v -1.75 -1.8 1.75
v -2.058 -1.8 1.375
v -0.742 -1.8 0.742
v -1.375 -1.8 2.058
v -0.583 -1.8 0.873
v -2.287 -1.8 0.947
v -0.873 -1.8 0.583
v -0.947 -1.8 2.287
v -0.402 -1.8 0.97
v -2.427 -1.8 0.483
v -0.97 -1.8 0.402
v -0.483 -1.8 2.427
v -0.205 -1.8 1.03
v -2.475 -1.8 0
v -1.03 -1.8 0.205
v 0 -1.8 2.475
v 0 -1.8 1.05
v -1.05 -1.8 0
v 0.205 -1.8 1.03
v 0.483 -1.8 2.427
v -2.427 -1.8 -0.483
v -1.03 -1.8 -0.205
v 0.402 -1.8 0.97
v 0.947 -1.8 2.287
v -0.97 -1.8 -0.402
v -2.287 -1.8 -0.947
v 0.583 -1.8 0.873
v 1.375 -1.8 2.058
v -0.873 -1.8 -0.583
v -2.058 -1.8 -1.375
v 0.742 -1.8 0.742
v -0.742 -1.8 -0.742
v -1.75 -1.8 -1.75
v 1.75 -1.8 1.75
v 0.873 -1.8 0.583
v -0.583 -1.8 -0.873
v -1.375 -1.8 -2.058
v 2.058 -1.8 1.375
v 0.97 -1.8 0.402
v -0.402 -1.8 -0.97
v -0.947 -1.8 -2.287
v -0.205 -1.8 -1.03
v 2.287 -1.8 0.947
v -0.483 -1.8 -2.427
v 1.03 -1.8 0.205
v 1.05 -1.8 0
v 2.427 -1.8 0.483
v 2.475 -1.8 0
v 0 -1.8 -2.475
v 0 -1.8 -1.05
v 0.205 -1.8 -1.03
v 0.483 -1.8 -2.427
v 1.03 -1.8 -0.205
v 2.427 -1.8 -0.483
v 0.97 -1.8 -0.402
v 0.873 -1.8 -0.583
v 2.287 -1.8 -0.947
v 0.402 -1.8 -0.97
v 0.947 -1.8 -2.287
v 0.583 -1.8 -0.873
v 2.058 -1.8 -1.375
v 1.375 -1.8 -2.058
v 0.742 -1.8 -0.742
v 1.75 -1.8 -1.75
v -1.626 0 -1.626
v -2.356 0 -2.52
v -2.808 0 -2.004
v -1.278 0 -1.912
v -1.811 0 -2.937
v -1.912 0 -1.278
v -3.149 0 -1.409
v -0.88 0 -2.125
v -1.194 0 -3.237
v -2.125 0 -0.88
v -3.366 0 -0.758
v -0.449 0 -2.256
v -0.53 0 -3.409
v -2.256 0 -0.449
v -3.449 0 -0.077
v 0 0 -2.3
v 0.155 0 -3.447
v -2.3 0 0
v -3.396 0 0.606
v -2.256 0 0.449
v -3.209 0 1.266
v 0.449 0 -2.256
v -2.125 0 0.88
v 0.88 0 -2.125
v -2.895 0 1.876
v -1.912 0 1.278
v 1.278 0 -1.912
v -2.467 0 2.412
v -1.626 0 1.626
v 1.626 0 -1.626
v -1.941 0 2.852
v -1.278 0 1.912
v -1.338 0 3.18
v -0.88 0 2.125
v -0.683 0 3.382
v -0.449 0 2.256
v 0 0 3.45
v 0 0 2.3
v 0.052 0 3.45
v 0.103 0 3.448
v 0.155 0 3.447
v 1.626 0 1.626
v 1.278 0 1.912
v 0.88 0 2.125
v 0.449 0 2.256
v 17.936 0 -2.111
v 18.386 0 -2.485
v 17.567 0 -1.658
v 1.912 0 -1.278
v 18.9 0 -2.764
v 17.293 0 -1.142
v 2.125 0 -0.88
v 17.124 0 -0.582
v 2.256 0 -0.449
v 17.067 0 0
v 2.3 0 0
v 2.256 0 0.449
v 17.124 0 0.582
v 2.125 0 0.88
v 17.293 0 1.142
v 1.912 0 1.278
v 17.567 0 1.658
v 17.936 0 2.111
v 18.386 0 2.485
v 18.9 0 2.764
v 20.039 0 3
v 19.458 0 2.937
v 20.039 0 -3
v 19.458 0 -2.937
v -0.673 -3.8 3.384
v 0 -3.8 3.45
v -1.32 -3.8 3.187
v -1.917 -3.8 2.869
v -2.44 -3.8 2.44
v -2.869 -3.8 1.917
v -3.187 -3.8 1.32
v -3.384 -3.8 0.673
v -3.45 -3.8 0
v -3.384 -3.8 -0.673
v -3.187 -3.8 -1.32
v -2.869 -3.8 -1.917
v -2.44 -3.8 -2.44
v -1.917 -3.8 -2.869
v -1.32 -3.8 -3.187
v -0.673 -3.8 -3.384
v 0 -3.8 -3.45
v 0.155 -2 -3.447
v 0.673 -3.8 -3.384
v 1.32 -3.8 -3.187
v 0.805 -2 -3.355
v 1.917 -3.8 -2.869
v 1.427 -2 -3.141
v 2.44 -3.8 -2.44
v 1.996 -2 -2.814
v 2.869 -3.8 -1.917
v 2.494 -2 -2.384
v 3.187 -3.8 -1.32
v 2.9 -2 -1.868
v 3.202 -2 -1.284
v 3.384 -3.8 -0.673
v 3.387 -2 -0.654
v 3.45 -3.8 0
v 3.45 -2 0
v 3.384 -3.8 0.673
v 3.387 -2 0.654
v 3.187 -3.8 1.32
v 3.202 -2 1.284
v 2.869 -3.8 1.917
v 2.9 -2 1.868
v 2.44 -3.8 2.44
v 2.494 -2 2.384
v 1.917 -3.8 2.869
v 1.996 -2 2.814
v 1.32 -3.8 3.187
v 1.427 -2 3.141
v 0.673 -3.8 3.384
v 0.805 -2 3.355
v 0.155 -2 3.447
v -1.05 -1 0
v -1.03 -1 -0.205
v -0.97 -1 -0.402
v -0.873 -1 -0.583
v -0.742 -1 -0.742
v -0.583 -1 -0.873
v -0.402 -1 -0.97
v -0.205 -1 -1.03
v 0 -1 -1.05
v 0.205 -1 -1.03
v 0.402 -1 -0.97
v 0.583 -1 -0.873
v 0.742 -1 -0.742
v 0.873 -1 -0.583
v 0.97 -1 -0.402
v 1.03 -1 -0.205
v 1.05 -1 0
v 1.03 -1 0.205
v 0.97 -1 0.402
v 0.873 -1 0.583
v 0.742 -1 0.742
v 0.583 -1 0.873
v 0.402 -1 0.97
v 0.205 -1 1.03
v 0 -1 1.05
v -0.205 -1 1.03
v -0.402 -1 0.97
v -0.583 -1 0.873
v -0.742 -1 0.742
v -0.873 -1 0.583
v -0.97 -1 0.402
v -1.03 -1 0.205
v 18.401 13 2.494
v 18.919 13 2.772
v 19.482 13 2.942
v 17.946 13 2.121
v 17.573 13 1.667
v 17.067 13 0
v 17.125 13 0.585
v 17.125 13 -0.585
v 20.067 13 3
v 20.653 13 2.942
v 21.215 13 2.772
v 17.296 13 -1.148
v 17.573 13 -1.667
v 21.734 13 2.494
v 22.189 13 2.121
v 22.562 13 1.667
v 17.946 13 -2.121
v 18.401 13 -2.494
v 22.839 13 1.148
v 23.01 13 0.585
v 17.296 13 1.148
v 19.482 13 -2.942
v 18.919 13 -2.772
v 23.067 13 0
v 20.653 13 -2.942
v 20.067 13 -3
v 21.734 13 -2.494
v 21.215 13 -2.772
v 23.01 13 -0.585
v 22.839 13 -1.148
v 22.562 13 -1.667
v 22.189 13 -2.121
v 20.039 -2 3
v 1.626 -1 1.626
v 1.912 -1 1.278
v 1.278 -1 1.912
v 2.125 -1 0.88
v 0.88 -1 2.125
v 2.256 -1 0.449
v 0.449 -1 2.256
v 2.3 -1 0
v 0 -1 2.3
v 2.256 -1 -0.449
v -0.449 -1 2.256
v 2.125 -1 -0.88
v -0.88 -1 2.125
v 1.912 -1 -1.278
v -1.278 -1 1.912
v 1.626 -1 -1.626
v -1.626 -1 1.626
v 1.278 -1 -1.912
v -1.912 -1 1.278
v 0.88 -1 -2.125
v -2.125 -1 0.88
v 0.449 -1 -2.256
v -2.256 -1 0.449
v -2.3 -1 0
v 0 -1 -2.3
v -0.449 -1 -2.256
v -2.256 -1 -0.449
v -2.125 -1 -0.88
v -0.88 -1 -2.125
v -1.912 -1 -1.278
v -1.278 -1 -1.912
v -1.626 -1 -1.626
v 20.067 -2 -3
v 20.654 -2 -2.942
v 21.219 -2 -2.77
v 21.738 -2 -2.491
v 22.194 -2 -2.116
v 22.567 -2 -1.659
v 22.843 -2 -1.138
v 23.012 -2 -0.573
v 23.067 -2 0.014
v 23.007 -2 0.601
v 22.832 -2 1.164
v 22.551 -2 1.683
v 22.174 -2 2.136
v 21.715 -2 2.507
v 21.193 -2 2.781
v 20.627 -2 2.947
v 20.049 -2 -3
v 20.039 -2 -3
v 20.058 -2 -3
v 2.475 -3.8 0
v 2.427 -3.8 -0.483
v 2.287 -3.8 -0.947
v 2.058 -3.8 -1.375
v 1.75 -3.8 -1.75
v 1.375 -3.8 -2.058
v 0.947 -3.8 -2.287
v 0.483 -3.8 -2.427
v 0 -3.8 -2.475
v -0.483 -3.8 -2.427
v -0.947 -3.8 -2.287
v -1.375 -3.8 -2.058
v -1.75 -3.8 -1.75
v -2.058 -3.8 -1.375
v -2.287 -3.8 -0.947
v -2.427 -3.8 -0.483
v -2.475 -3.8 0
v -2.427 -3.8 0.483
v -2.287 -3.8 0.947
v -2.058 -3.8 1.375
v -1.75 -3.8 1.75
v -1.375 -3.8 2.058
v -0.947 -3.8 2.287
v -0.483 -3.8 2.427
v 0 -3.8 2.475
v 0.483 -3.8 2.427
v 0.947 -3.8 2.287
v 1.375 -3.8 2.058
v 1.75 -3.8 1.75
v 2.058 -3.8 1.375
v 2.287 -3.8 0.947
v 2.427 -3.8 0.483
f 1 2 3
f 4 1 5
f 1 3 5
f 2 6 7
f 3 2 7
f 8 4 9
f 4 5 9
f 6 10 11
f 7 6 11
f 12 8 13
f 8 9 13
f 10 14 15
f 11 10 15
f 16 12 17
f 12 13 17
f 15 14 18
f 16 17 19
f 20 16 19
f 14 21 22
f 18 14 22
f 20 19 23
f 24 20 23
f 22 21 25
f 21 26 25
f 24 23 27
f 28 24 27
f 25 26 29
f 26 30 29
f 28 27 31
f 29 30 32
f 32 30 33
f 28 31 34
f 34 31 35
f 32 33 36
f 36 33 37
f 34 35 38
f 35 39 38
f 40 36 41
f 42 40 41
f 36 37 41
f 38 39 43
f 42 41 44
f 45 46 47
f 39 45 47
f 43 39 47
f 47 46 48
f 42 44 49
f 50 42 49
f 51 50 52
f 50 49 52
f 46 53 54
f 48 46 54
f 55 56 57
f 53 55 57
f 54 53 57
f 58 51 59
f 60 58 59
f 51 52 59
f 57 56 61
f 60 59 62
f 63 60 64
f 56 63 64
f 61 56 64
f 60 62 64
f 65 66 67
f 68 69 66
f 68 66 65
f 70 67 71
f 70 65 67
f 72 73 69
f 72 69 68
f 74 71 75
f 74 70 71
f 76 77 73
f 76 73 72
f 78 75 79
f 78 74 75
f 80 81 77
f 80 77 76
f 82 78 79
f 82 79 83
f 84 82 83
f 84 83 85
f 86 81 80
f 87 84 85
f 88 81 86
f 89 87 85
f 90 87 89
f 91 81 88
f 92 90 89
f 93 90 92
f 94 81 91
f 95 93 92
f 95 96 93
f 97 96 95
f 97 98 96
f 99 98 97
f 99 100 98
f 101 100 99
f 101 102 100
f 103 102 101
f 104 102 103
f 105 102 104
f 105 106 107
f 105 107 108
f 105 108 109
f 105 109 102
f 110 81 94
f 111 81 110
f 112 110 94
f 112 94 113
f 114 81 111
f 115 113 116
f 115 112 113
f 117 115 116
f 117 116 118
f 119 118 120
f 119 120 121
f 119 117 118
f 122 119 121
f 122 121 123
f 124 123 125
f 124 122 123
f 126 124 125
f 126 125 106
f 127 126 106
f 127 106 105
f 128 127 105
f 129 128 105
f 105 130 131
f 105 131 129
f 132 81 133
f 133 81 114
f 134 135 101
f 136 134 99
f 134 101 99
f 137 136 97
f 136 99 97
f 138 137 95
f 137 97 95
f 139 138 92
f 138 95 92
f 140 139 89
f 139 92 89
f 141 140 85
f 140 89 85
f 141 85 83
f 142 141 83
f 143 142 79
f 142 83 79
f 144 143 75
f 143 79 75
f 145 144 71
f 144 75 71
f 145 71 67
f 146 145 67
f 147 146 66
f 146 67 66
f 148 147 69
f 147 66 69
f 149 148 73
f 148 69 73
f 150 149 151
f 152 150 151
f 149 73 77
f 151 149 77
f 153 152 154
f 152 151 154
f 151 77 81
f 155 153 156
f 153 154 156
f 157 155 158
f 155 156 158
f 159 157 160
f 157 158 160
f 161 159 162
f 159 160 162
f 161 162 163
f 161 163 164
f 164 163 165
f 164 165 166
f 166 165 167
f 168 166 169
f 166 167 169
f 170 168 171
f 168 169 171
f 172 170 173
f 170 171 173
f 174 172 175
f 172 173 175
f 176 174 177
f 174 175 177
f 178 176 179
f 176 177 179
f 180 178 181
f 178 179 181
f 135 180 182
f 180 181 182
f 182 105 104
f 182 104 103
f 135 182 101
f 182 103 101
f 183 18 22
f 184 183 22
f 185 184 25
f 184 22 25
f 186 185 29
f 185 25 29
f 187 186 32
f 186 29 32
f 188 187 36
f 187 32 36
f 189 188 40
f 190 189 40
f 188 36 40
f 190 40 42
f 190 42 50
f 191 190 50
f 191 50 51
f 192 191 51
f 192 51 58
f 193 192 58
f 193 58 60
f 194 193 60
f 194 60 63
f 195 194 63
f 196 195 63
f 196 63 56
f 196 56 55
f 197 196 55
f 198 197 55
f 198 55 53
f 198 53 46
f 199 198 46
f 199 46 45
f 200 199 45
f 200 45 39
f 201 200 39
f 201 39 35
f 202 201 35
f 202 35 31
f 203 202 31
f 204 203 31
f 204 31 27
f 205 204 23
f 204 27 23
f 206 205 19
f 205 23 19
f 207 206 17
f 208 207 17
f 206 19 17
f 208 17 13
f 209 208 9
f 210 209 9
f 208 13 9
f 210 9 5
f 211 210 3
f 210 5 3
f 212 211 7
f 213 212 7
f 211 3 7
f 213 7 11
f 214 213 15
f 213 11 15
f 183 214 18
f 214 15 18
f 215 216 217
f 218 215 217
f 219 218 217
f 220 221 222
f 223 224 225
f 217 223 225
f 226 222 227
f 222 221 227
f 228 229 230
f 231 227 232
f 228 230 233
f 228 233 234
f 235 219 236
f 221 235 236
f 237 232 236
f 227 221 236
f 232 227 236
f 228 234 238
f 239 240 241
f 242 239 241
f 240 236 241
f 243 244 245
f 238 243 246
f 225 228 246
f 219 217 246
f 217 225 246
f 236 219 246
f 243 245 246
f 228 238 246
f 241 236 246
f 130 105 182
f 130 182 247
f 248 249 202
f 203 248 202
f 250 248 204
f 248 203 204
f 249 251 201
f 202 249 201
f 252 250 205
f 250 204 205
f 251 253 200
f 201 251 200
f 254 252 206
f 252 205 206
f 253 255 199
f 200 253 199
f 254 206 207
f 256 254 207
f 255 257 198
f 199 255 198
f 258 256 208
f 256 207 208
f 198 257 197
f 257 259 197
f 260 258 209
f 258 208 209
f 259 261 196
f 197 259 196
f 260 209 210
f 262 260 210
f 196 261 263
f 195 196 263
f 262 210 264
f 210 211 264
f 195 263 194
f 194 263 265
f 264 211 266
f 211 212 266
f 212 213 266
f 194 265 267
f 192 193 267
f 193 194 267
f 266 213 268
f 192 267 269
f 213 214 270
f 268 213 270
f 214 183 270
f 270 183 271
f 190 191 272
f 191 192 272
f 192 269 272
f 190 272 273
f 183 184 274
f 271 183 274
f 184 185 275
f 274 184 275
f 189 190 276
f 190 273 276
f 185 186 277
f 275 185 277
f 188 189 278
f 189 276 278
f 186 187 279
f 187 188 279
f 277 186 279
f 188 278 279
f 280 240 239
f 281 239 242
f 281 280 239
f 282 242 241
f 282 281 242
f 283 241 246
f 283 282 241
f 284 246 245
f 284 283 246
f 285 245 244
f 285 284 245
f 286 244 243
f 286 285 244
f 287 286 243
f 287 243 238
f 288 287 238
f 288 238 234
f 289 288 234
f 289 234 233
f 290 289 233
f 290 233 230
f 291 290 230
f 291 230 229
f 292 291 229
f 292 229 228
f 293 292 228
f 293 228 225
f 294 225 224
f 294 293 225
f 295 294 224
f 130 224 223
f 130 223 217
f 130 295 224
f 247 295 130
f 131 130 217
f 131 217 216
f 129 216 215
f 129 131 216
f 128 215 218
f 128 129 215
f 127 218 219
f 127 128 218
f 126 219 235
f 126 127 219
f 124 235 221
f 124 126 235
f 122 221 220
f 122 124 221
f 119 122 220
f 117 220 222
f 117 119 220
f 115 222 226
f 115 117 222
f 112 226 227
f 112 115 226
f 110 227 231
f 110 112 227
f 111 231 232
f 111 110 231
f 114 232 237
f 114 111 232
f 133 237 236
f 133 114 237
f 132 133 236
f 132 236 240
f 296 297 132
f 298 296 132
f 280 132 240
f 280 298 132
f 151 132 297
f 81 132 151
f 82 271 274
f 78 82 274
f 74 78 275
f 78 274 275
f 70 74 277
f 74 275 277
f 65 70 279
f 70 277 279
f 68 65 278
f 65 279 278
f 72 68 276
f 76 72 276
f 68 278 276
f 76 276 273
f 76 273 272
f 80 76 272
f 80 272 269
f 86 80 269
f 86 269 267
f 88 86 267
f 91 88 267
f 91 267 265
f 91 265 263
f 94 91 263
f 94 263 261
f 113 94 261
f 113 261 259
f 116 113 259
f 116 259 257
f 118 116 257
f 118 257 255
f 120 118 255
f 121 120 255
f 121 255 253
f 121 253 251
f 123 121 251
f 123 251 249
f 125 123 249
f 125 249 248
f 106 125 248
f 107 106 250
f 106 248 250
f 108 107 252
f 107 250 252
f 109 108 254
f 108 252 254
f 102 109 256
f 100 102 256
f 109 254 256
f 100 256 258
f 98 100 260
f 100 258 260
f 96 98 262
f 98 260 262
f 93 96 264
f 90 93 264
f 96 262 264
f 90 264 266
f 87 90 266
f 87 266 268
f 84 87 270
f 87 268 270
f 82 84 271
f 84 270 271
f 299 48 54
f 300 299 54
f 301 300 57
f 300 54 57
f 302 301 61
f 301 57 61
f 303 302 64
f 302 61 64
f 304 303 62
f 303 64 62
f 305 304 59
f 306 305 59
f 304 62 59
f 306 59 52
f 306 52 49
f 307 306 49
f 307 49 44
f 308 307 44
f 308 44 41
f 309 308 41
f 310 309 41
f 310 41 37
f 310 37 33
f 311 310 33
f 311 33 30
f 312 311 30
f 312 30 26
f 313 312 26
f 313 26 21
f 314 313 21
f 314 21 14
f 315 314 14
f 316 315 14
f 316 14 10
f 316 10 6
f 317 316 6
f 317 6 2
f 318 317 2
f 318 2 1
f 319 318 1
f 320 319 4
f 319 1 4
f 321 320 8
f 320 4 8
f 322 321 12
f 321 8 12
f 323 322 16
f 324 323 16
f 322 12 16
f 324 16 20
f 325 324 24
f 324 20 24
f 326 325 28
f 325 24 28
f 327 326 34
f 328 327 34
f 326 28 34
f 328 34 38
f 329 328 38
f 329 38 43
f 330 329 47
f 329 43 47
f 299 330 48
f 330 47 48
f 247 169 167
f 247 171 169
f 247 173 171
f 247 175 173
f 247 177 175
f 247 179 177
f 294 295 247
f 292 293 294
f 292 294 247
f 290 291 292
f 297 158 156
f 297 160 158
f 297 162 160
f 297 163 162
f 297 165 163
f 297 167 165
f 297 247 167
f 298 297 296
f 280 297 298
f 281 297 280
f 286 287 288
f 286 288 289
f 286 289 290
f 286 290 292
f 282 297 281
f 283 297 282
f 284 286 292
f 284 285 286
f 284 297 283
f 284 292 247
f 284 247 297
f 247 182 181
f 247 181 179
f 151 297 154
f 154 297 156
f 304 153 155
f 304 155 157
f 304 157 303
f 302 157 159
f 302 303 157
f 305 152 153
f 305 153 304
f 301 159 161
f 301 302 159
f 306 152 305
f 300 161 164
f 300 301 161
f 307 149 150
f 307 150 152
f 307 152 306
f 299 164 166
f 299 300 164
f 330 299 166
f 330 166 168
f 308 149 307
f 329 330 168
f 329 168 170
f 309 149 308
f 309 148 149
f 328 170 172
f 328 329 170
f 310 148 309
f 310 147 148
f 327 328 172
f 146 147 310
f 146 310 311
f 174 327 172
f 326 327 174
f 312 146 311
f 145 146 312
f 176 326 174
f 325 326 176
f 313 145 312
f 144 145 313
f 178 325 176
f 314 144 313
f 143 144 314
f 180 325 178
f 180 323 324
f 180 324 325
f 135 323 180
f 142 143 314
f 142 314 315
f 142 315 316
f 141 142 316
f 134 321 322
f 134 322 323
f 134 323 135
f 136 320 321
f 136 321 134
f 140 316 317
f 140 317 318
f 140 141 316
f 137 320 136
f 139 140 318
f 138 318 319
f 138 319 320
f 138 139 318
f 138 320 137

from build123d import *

# Parameters (mm, degrees)
ESBO_O1_R                = 3.45
RESSALTO_EXTRUS_O1_DEPTH = 1.4
ESBO_O2_R                = 3.45
RESSALTO_EXTRUS_O2_DEPTH = 2.4
FURO1_D                  = 4.95
FURO1_DEPTH              = 2
FURO2_D                  = 4.6
FURO2_DEPTH              = 1
FURO3_D                  = 2.1
BOSS_EXTRUDE1_DEPTH      = 2
SKETCH3_R                = 3
BOSS_EXTRUDE2_DEPTH      = 15


with BuildPart() as part:
    # Esboço1 → Ressalto-extrusão1 (new body)
    with BuildSketch(Plane(origin=(0, 0, 0), x_dir=(1, 0, 0), z_dir=(0, 1, 0))):
        with Locations(Location((0, 0, 0), (0, 0, 270))):
            Circle(ESBO_O1_R)
    extrude(amount=-RESSALTO_EXTRUS_O1_DEPTH)

    # Esboço2 → Ressalto-extrusão2 (add)
    with BuildSketch(Plane.XZ.offset(1.4)):
        with Locations(Location((0, 0, 0), (0, 0, 90))):
            Circle(ESBO_O2_R)
    extrude(amount=RESSALTO_EXTRUS_O2_DEPTH)

    # Furo1
    with Locations(Plane(origin=(0, -3.8, 0), x_dir=(-1, 0, 0), z_dir=(0, -1, 0))):
        with Locations((0, 0)):
            Hole(FURO1_D / 2, depth=FURO1_DEPTH)

    # Furo2
    with Locations(Plane(origin=(0, 0, 0), x_dir=(1, 0, 0), z_dir=(0, 1, 0))):
        with Locations((0, 0)):
            Hole(FURO2_D / 2, depth=FURO2_DEPTH)

    # Furo3 (through all)
    with Locations(Plane(origin=(0, 0, 0), x_dir=(1, 0, 0), z_dir=(0, 1, 0))):
        with Locations((0, 0)):
            Hole(FURO3_D / 2)

    # Sketch2 → Boss-Extrude1 (add)
    with BuildSketch(Plane(origin=(0, 0, 0), x_dir=(1, 0, 0), z_dir=(0, 1, 0))):
        with BuildLine():
            Line((20.067369497, 2.999243463), (0.154910769, 3.446520369))
            ThreePointArc((0.154910769, 3.446520369), (2.493686243, 2.384120157), (3.45, 0))
            ThreePointArc((3.45, 0), (2.493686243, -2.384120157), (0.154910769, -3.446520369))
            Line((0.154910769, -3.446520369), (20.067369497, -2.999243463))
            ThreePointArc((20.067369497, -2.999243463), (23, 0), (20.067369497, 2.999243463))
        make_face()
    extrude(amount=-BOSS_EXTRUDE1_DEPTH)

    # Sketch3 → Boss-Extrude2 (add)
    with BuildSketch(Plane.XZ.offset(2)):
        with Locations(Location((20.067369497, 0, 0), (0, 0, 270))):
            Circle(SKETCH3_R)
    extrude(amount=-BOSS_EXTRUDE2_DEPTH)


solid = part.part
